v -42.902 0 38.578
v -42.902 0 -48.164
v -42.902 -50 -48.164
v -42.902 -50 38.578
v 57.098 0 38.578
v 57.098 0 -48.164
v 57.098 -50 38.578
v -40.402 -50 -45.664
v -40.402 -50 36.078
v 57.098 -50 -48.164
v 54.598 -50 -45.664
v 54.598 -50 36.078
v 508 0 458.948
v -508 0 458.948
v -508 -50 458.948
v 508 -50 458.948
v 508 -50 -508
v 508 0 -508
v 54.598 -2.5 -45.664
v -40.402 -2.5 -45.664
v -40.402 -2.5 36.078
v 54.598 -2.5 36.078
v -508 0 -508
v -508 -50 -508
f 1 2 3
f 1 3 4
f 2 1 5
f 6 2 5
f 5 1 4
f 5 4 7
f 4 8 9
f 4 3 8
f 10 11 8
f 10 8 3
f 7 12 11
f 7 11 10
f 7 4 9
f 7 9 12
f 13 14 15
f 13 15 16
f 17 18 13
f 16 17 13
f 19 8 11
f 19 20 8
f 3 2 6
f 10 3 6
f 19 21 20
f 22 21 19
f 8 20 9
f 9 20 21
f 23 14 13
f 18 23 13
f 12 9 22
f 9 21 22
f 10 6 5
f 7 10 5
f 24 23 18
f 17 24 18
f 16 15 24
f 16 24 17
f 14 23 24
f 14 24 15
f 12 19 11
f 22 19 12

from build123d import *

# Parameters (mm, degrees)
F0_W     = 100
F0_H     = 86.7424257066
F2_DEPTH = 50
F1_W     = 1016
F1_H     = 966.9476541734
F3_T     = -2.5


# Not quite as in the source:
# - a feature names something its author has since deleted; it is built from what else it names


with BuildPart() as f2:
    # F0 (on Front) → F2 (new body)
    with BuildSketch(Plane.XZ):
        with Locations((7.0976624265, -4.7932257876)):
            Rectangle(F0_W, F0_H)
    extrude(amount=F2_DEPTH)

    # F3
    f3_openings = [f2.faces().sort_by_distance(p)[0] for p in [
        (7.097662, -50, -4.793226),
    ]]
    offset(amount=F3_T, openings=f3_openings)


with BuildPart() as f2b:
    # F1 (on face) → F2, piece 2 (new body)
    with BuildSketch(Plane.XZ):
        with Locations((0, -24.5261729133)):
            Rectangle(F1_W, F1_H)
    extrude(amount=F2_DEPTH)


solid = Compound([f2.part, f2b.part])
